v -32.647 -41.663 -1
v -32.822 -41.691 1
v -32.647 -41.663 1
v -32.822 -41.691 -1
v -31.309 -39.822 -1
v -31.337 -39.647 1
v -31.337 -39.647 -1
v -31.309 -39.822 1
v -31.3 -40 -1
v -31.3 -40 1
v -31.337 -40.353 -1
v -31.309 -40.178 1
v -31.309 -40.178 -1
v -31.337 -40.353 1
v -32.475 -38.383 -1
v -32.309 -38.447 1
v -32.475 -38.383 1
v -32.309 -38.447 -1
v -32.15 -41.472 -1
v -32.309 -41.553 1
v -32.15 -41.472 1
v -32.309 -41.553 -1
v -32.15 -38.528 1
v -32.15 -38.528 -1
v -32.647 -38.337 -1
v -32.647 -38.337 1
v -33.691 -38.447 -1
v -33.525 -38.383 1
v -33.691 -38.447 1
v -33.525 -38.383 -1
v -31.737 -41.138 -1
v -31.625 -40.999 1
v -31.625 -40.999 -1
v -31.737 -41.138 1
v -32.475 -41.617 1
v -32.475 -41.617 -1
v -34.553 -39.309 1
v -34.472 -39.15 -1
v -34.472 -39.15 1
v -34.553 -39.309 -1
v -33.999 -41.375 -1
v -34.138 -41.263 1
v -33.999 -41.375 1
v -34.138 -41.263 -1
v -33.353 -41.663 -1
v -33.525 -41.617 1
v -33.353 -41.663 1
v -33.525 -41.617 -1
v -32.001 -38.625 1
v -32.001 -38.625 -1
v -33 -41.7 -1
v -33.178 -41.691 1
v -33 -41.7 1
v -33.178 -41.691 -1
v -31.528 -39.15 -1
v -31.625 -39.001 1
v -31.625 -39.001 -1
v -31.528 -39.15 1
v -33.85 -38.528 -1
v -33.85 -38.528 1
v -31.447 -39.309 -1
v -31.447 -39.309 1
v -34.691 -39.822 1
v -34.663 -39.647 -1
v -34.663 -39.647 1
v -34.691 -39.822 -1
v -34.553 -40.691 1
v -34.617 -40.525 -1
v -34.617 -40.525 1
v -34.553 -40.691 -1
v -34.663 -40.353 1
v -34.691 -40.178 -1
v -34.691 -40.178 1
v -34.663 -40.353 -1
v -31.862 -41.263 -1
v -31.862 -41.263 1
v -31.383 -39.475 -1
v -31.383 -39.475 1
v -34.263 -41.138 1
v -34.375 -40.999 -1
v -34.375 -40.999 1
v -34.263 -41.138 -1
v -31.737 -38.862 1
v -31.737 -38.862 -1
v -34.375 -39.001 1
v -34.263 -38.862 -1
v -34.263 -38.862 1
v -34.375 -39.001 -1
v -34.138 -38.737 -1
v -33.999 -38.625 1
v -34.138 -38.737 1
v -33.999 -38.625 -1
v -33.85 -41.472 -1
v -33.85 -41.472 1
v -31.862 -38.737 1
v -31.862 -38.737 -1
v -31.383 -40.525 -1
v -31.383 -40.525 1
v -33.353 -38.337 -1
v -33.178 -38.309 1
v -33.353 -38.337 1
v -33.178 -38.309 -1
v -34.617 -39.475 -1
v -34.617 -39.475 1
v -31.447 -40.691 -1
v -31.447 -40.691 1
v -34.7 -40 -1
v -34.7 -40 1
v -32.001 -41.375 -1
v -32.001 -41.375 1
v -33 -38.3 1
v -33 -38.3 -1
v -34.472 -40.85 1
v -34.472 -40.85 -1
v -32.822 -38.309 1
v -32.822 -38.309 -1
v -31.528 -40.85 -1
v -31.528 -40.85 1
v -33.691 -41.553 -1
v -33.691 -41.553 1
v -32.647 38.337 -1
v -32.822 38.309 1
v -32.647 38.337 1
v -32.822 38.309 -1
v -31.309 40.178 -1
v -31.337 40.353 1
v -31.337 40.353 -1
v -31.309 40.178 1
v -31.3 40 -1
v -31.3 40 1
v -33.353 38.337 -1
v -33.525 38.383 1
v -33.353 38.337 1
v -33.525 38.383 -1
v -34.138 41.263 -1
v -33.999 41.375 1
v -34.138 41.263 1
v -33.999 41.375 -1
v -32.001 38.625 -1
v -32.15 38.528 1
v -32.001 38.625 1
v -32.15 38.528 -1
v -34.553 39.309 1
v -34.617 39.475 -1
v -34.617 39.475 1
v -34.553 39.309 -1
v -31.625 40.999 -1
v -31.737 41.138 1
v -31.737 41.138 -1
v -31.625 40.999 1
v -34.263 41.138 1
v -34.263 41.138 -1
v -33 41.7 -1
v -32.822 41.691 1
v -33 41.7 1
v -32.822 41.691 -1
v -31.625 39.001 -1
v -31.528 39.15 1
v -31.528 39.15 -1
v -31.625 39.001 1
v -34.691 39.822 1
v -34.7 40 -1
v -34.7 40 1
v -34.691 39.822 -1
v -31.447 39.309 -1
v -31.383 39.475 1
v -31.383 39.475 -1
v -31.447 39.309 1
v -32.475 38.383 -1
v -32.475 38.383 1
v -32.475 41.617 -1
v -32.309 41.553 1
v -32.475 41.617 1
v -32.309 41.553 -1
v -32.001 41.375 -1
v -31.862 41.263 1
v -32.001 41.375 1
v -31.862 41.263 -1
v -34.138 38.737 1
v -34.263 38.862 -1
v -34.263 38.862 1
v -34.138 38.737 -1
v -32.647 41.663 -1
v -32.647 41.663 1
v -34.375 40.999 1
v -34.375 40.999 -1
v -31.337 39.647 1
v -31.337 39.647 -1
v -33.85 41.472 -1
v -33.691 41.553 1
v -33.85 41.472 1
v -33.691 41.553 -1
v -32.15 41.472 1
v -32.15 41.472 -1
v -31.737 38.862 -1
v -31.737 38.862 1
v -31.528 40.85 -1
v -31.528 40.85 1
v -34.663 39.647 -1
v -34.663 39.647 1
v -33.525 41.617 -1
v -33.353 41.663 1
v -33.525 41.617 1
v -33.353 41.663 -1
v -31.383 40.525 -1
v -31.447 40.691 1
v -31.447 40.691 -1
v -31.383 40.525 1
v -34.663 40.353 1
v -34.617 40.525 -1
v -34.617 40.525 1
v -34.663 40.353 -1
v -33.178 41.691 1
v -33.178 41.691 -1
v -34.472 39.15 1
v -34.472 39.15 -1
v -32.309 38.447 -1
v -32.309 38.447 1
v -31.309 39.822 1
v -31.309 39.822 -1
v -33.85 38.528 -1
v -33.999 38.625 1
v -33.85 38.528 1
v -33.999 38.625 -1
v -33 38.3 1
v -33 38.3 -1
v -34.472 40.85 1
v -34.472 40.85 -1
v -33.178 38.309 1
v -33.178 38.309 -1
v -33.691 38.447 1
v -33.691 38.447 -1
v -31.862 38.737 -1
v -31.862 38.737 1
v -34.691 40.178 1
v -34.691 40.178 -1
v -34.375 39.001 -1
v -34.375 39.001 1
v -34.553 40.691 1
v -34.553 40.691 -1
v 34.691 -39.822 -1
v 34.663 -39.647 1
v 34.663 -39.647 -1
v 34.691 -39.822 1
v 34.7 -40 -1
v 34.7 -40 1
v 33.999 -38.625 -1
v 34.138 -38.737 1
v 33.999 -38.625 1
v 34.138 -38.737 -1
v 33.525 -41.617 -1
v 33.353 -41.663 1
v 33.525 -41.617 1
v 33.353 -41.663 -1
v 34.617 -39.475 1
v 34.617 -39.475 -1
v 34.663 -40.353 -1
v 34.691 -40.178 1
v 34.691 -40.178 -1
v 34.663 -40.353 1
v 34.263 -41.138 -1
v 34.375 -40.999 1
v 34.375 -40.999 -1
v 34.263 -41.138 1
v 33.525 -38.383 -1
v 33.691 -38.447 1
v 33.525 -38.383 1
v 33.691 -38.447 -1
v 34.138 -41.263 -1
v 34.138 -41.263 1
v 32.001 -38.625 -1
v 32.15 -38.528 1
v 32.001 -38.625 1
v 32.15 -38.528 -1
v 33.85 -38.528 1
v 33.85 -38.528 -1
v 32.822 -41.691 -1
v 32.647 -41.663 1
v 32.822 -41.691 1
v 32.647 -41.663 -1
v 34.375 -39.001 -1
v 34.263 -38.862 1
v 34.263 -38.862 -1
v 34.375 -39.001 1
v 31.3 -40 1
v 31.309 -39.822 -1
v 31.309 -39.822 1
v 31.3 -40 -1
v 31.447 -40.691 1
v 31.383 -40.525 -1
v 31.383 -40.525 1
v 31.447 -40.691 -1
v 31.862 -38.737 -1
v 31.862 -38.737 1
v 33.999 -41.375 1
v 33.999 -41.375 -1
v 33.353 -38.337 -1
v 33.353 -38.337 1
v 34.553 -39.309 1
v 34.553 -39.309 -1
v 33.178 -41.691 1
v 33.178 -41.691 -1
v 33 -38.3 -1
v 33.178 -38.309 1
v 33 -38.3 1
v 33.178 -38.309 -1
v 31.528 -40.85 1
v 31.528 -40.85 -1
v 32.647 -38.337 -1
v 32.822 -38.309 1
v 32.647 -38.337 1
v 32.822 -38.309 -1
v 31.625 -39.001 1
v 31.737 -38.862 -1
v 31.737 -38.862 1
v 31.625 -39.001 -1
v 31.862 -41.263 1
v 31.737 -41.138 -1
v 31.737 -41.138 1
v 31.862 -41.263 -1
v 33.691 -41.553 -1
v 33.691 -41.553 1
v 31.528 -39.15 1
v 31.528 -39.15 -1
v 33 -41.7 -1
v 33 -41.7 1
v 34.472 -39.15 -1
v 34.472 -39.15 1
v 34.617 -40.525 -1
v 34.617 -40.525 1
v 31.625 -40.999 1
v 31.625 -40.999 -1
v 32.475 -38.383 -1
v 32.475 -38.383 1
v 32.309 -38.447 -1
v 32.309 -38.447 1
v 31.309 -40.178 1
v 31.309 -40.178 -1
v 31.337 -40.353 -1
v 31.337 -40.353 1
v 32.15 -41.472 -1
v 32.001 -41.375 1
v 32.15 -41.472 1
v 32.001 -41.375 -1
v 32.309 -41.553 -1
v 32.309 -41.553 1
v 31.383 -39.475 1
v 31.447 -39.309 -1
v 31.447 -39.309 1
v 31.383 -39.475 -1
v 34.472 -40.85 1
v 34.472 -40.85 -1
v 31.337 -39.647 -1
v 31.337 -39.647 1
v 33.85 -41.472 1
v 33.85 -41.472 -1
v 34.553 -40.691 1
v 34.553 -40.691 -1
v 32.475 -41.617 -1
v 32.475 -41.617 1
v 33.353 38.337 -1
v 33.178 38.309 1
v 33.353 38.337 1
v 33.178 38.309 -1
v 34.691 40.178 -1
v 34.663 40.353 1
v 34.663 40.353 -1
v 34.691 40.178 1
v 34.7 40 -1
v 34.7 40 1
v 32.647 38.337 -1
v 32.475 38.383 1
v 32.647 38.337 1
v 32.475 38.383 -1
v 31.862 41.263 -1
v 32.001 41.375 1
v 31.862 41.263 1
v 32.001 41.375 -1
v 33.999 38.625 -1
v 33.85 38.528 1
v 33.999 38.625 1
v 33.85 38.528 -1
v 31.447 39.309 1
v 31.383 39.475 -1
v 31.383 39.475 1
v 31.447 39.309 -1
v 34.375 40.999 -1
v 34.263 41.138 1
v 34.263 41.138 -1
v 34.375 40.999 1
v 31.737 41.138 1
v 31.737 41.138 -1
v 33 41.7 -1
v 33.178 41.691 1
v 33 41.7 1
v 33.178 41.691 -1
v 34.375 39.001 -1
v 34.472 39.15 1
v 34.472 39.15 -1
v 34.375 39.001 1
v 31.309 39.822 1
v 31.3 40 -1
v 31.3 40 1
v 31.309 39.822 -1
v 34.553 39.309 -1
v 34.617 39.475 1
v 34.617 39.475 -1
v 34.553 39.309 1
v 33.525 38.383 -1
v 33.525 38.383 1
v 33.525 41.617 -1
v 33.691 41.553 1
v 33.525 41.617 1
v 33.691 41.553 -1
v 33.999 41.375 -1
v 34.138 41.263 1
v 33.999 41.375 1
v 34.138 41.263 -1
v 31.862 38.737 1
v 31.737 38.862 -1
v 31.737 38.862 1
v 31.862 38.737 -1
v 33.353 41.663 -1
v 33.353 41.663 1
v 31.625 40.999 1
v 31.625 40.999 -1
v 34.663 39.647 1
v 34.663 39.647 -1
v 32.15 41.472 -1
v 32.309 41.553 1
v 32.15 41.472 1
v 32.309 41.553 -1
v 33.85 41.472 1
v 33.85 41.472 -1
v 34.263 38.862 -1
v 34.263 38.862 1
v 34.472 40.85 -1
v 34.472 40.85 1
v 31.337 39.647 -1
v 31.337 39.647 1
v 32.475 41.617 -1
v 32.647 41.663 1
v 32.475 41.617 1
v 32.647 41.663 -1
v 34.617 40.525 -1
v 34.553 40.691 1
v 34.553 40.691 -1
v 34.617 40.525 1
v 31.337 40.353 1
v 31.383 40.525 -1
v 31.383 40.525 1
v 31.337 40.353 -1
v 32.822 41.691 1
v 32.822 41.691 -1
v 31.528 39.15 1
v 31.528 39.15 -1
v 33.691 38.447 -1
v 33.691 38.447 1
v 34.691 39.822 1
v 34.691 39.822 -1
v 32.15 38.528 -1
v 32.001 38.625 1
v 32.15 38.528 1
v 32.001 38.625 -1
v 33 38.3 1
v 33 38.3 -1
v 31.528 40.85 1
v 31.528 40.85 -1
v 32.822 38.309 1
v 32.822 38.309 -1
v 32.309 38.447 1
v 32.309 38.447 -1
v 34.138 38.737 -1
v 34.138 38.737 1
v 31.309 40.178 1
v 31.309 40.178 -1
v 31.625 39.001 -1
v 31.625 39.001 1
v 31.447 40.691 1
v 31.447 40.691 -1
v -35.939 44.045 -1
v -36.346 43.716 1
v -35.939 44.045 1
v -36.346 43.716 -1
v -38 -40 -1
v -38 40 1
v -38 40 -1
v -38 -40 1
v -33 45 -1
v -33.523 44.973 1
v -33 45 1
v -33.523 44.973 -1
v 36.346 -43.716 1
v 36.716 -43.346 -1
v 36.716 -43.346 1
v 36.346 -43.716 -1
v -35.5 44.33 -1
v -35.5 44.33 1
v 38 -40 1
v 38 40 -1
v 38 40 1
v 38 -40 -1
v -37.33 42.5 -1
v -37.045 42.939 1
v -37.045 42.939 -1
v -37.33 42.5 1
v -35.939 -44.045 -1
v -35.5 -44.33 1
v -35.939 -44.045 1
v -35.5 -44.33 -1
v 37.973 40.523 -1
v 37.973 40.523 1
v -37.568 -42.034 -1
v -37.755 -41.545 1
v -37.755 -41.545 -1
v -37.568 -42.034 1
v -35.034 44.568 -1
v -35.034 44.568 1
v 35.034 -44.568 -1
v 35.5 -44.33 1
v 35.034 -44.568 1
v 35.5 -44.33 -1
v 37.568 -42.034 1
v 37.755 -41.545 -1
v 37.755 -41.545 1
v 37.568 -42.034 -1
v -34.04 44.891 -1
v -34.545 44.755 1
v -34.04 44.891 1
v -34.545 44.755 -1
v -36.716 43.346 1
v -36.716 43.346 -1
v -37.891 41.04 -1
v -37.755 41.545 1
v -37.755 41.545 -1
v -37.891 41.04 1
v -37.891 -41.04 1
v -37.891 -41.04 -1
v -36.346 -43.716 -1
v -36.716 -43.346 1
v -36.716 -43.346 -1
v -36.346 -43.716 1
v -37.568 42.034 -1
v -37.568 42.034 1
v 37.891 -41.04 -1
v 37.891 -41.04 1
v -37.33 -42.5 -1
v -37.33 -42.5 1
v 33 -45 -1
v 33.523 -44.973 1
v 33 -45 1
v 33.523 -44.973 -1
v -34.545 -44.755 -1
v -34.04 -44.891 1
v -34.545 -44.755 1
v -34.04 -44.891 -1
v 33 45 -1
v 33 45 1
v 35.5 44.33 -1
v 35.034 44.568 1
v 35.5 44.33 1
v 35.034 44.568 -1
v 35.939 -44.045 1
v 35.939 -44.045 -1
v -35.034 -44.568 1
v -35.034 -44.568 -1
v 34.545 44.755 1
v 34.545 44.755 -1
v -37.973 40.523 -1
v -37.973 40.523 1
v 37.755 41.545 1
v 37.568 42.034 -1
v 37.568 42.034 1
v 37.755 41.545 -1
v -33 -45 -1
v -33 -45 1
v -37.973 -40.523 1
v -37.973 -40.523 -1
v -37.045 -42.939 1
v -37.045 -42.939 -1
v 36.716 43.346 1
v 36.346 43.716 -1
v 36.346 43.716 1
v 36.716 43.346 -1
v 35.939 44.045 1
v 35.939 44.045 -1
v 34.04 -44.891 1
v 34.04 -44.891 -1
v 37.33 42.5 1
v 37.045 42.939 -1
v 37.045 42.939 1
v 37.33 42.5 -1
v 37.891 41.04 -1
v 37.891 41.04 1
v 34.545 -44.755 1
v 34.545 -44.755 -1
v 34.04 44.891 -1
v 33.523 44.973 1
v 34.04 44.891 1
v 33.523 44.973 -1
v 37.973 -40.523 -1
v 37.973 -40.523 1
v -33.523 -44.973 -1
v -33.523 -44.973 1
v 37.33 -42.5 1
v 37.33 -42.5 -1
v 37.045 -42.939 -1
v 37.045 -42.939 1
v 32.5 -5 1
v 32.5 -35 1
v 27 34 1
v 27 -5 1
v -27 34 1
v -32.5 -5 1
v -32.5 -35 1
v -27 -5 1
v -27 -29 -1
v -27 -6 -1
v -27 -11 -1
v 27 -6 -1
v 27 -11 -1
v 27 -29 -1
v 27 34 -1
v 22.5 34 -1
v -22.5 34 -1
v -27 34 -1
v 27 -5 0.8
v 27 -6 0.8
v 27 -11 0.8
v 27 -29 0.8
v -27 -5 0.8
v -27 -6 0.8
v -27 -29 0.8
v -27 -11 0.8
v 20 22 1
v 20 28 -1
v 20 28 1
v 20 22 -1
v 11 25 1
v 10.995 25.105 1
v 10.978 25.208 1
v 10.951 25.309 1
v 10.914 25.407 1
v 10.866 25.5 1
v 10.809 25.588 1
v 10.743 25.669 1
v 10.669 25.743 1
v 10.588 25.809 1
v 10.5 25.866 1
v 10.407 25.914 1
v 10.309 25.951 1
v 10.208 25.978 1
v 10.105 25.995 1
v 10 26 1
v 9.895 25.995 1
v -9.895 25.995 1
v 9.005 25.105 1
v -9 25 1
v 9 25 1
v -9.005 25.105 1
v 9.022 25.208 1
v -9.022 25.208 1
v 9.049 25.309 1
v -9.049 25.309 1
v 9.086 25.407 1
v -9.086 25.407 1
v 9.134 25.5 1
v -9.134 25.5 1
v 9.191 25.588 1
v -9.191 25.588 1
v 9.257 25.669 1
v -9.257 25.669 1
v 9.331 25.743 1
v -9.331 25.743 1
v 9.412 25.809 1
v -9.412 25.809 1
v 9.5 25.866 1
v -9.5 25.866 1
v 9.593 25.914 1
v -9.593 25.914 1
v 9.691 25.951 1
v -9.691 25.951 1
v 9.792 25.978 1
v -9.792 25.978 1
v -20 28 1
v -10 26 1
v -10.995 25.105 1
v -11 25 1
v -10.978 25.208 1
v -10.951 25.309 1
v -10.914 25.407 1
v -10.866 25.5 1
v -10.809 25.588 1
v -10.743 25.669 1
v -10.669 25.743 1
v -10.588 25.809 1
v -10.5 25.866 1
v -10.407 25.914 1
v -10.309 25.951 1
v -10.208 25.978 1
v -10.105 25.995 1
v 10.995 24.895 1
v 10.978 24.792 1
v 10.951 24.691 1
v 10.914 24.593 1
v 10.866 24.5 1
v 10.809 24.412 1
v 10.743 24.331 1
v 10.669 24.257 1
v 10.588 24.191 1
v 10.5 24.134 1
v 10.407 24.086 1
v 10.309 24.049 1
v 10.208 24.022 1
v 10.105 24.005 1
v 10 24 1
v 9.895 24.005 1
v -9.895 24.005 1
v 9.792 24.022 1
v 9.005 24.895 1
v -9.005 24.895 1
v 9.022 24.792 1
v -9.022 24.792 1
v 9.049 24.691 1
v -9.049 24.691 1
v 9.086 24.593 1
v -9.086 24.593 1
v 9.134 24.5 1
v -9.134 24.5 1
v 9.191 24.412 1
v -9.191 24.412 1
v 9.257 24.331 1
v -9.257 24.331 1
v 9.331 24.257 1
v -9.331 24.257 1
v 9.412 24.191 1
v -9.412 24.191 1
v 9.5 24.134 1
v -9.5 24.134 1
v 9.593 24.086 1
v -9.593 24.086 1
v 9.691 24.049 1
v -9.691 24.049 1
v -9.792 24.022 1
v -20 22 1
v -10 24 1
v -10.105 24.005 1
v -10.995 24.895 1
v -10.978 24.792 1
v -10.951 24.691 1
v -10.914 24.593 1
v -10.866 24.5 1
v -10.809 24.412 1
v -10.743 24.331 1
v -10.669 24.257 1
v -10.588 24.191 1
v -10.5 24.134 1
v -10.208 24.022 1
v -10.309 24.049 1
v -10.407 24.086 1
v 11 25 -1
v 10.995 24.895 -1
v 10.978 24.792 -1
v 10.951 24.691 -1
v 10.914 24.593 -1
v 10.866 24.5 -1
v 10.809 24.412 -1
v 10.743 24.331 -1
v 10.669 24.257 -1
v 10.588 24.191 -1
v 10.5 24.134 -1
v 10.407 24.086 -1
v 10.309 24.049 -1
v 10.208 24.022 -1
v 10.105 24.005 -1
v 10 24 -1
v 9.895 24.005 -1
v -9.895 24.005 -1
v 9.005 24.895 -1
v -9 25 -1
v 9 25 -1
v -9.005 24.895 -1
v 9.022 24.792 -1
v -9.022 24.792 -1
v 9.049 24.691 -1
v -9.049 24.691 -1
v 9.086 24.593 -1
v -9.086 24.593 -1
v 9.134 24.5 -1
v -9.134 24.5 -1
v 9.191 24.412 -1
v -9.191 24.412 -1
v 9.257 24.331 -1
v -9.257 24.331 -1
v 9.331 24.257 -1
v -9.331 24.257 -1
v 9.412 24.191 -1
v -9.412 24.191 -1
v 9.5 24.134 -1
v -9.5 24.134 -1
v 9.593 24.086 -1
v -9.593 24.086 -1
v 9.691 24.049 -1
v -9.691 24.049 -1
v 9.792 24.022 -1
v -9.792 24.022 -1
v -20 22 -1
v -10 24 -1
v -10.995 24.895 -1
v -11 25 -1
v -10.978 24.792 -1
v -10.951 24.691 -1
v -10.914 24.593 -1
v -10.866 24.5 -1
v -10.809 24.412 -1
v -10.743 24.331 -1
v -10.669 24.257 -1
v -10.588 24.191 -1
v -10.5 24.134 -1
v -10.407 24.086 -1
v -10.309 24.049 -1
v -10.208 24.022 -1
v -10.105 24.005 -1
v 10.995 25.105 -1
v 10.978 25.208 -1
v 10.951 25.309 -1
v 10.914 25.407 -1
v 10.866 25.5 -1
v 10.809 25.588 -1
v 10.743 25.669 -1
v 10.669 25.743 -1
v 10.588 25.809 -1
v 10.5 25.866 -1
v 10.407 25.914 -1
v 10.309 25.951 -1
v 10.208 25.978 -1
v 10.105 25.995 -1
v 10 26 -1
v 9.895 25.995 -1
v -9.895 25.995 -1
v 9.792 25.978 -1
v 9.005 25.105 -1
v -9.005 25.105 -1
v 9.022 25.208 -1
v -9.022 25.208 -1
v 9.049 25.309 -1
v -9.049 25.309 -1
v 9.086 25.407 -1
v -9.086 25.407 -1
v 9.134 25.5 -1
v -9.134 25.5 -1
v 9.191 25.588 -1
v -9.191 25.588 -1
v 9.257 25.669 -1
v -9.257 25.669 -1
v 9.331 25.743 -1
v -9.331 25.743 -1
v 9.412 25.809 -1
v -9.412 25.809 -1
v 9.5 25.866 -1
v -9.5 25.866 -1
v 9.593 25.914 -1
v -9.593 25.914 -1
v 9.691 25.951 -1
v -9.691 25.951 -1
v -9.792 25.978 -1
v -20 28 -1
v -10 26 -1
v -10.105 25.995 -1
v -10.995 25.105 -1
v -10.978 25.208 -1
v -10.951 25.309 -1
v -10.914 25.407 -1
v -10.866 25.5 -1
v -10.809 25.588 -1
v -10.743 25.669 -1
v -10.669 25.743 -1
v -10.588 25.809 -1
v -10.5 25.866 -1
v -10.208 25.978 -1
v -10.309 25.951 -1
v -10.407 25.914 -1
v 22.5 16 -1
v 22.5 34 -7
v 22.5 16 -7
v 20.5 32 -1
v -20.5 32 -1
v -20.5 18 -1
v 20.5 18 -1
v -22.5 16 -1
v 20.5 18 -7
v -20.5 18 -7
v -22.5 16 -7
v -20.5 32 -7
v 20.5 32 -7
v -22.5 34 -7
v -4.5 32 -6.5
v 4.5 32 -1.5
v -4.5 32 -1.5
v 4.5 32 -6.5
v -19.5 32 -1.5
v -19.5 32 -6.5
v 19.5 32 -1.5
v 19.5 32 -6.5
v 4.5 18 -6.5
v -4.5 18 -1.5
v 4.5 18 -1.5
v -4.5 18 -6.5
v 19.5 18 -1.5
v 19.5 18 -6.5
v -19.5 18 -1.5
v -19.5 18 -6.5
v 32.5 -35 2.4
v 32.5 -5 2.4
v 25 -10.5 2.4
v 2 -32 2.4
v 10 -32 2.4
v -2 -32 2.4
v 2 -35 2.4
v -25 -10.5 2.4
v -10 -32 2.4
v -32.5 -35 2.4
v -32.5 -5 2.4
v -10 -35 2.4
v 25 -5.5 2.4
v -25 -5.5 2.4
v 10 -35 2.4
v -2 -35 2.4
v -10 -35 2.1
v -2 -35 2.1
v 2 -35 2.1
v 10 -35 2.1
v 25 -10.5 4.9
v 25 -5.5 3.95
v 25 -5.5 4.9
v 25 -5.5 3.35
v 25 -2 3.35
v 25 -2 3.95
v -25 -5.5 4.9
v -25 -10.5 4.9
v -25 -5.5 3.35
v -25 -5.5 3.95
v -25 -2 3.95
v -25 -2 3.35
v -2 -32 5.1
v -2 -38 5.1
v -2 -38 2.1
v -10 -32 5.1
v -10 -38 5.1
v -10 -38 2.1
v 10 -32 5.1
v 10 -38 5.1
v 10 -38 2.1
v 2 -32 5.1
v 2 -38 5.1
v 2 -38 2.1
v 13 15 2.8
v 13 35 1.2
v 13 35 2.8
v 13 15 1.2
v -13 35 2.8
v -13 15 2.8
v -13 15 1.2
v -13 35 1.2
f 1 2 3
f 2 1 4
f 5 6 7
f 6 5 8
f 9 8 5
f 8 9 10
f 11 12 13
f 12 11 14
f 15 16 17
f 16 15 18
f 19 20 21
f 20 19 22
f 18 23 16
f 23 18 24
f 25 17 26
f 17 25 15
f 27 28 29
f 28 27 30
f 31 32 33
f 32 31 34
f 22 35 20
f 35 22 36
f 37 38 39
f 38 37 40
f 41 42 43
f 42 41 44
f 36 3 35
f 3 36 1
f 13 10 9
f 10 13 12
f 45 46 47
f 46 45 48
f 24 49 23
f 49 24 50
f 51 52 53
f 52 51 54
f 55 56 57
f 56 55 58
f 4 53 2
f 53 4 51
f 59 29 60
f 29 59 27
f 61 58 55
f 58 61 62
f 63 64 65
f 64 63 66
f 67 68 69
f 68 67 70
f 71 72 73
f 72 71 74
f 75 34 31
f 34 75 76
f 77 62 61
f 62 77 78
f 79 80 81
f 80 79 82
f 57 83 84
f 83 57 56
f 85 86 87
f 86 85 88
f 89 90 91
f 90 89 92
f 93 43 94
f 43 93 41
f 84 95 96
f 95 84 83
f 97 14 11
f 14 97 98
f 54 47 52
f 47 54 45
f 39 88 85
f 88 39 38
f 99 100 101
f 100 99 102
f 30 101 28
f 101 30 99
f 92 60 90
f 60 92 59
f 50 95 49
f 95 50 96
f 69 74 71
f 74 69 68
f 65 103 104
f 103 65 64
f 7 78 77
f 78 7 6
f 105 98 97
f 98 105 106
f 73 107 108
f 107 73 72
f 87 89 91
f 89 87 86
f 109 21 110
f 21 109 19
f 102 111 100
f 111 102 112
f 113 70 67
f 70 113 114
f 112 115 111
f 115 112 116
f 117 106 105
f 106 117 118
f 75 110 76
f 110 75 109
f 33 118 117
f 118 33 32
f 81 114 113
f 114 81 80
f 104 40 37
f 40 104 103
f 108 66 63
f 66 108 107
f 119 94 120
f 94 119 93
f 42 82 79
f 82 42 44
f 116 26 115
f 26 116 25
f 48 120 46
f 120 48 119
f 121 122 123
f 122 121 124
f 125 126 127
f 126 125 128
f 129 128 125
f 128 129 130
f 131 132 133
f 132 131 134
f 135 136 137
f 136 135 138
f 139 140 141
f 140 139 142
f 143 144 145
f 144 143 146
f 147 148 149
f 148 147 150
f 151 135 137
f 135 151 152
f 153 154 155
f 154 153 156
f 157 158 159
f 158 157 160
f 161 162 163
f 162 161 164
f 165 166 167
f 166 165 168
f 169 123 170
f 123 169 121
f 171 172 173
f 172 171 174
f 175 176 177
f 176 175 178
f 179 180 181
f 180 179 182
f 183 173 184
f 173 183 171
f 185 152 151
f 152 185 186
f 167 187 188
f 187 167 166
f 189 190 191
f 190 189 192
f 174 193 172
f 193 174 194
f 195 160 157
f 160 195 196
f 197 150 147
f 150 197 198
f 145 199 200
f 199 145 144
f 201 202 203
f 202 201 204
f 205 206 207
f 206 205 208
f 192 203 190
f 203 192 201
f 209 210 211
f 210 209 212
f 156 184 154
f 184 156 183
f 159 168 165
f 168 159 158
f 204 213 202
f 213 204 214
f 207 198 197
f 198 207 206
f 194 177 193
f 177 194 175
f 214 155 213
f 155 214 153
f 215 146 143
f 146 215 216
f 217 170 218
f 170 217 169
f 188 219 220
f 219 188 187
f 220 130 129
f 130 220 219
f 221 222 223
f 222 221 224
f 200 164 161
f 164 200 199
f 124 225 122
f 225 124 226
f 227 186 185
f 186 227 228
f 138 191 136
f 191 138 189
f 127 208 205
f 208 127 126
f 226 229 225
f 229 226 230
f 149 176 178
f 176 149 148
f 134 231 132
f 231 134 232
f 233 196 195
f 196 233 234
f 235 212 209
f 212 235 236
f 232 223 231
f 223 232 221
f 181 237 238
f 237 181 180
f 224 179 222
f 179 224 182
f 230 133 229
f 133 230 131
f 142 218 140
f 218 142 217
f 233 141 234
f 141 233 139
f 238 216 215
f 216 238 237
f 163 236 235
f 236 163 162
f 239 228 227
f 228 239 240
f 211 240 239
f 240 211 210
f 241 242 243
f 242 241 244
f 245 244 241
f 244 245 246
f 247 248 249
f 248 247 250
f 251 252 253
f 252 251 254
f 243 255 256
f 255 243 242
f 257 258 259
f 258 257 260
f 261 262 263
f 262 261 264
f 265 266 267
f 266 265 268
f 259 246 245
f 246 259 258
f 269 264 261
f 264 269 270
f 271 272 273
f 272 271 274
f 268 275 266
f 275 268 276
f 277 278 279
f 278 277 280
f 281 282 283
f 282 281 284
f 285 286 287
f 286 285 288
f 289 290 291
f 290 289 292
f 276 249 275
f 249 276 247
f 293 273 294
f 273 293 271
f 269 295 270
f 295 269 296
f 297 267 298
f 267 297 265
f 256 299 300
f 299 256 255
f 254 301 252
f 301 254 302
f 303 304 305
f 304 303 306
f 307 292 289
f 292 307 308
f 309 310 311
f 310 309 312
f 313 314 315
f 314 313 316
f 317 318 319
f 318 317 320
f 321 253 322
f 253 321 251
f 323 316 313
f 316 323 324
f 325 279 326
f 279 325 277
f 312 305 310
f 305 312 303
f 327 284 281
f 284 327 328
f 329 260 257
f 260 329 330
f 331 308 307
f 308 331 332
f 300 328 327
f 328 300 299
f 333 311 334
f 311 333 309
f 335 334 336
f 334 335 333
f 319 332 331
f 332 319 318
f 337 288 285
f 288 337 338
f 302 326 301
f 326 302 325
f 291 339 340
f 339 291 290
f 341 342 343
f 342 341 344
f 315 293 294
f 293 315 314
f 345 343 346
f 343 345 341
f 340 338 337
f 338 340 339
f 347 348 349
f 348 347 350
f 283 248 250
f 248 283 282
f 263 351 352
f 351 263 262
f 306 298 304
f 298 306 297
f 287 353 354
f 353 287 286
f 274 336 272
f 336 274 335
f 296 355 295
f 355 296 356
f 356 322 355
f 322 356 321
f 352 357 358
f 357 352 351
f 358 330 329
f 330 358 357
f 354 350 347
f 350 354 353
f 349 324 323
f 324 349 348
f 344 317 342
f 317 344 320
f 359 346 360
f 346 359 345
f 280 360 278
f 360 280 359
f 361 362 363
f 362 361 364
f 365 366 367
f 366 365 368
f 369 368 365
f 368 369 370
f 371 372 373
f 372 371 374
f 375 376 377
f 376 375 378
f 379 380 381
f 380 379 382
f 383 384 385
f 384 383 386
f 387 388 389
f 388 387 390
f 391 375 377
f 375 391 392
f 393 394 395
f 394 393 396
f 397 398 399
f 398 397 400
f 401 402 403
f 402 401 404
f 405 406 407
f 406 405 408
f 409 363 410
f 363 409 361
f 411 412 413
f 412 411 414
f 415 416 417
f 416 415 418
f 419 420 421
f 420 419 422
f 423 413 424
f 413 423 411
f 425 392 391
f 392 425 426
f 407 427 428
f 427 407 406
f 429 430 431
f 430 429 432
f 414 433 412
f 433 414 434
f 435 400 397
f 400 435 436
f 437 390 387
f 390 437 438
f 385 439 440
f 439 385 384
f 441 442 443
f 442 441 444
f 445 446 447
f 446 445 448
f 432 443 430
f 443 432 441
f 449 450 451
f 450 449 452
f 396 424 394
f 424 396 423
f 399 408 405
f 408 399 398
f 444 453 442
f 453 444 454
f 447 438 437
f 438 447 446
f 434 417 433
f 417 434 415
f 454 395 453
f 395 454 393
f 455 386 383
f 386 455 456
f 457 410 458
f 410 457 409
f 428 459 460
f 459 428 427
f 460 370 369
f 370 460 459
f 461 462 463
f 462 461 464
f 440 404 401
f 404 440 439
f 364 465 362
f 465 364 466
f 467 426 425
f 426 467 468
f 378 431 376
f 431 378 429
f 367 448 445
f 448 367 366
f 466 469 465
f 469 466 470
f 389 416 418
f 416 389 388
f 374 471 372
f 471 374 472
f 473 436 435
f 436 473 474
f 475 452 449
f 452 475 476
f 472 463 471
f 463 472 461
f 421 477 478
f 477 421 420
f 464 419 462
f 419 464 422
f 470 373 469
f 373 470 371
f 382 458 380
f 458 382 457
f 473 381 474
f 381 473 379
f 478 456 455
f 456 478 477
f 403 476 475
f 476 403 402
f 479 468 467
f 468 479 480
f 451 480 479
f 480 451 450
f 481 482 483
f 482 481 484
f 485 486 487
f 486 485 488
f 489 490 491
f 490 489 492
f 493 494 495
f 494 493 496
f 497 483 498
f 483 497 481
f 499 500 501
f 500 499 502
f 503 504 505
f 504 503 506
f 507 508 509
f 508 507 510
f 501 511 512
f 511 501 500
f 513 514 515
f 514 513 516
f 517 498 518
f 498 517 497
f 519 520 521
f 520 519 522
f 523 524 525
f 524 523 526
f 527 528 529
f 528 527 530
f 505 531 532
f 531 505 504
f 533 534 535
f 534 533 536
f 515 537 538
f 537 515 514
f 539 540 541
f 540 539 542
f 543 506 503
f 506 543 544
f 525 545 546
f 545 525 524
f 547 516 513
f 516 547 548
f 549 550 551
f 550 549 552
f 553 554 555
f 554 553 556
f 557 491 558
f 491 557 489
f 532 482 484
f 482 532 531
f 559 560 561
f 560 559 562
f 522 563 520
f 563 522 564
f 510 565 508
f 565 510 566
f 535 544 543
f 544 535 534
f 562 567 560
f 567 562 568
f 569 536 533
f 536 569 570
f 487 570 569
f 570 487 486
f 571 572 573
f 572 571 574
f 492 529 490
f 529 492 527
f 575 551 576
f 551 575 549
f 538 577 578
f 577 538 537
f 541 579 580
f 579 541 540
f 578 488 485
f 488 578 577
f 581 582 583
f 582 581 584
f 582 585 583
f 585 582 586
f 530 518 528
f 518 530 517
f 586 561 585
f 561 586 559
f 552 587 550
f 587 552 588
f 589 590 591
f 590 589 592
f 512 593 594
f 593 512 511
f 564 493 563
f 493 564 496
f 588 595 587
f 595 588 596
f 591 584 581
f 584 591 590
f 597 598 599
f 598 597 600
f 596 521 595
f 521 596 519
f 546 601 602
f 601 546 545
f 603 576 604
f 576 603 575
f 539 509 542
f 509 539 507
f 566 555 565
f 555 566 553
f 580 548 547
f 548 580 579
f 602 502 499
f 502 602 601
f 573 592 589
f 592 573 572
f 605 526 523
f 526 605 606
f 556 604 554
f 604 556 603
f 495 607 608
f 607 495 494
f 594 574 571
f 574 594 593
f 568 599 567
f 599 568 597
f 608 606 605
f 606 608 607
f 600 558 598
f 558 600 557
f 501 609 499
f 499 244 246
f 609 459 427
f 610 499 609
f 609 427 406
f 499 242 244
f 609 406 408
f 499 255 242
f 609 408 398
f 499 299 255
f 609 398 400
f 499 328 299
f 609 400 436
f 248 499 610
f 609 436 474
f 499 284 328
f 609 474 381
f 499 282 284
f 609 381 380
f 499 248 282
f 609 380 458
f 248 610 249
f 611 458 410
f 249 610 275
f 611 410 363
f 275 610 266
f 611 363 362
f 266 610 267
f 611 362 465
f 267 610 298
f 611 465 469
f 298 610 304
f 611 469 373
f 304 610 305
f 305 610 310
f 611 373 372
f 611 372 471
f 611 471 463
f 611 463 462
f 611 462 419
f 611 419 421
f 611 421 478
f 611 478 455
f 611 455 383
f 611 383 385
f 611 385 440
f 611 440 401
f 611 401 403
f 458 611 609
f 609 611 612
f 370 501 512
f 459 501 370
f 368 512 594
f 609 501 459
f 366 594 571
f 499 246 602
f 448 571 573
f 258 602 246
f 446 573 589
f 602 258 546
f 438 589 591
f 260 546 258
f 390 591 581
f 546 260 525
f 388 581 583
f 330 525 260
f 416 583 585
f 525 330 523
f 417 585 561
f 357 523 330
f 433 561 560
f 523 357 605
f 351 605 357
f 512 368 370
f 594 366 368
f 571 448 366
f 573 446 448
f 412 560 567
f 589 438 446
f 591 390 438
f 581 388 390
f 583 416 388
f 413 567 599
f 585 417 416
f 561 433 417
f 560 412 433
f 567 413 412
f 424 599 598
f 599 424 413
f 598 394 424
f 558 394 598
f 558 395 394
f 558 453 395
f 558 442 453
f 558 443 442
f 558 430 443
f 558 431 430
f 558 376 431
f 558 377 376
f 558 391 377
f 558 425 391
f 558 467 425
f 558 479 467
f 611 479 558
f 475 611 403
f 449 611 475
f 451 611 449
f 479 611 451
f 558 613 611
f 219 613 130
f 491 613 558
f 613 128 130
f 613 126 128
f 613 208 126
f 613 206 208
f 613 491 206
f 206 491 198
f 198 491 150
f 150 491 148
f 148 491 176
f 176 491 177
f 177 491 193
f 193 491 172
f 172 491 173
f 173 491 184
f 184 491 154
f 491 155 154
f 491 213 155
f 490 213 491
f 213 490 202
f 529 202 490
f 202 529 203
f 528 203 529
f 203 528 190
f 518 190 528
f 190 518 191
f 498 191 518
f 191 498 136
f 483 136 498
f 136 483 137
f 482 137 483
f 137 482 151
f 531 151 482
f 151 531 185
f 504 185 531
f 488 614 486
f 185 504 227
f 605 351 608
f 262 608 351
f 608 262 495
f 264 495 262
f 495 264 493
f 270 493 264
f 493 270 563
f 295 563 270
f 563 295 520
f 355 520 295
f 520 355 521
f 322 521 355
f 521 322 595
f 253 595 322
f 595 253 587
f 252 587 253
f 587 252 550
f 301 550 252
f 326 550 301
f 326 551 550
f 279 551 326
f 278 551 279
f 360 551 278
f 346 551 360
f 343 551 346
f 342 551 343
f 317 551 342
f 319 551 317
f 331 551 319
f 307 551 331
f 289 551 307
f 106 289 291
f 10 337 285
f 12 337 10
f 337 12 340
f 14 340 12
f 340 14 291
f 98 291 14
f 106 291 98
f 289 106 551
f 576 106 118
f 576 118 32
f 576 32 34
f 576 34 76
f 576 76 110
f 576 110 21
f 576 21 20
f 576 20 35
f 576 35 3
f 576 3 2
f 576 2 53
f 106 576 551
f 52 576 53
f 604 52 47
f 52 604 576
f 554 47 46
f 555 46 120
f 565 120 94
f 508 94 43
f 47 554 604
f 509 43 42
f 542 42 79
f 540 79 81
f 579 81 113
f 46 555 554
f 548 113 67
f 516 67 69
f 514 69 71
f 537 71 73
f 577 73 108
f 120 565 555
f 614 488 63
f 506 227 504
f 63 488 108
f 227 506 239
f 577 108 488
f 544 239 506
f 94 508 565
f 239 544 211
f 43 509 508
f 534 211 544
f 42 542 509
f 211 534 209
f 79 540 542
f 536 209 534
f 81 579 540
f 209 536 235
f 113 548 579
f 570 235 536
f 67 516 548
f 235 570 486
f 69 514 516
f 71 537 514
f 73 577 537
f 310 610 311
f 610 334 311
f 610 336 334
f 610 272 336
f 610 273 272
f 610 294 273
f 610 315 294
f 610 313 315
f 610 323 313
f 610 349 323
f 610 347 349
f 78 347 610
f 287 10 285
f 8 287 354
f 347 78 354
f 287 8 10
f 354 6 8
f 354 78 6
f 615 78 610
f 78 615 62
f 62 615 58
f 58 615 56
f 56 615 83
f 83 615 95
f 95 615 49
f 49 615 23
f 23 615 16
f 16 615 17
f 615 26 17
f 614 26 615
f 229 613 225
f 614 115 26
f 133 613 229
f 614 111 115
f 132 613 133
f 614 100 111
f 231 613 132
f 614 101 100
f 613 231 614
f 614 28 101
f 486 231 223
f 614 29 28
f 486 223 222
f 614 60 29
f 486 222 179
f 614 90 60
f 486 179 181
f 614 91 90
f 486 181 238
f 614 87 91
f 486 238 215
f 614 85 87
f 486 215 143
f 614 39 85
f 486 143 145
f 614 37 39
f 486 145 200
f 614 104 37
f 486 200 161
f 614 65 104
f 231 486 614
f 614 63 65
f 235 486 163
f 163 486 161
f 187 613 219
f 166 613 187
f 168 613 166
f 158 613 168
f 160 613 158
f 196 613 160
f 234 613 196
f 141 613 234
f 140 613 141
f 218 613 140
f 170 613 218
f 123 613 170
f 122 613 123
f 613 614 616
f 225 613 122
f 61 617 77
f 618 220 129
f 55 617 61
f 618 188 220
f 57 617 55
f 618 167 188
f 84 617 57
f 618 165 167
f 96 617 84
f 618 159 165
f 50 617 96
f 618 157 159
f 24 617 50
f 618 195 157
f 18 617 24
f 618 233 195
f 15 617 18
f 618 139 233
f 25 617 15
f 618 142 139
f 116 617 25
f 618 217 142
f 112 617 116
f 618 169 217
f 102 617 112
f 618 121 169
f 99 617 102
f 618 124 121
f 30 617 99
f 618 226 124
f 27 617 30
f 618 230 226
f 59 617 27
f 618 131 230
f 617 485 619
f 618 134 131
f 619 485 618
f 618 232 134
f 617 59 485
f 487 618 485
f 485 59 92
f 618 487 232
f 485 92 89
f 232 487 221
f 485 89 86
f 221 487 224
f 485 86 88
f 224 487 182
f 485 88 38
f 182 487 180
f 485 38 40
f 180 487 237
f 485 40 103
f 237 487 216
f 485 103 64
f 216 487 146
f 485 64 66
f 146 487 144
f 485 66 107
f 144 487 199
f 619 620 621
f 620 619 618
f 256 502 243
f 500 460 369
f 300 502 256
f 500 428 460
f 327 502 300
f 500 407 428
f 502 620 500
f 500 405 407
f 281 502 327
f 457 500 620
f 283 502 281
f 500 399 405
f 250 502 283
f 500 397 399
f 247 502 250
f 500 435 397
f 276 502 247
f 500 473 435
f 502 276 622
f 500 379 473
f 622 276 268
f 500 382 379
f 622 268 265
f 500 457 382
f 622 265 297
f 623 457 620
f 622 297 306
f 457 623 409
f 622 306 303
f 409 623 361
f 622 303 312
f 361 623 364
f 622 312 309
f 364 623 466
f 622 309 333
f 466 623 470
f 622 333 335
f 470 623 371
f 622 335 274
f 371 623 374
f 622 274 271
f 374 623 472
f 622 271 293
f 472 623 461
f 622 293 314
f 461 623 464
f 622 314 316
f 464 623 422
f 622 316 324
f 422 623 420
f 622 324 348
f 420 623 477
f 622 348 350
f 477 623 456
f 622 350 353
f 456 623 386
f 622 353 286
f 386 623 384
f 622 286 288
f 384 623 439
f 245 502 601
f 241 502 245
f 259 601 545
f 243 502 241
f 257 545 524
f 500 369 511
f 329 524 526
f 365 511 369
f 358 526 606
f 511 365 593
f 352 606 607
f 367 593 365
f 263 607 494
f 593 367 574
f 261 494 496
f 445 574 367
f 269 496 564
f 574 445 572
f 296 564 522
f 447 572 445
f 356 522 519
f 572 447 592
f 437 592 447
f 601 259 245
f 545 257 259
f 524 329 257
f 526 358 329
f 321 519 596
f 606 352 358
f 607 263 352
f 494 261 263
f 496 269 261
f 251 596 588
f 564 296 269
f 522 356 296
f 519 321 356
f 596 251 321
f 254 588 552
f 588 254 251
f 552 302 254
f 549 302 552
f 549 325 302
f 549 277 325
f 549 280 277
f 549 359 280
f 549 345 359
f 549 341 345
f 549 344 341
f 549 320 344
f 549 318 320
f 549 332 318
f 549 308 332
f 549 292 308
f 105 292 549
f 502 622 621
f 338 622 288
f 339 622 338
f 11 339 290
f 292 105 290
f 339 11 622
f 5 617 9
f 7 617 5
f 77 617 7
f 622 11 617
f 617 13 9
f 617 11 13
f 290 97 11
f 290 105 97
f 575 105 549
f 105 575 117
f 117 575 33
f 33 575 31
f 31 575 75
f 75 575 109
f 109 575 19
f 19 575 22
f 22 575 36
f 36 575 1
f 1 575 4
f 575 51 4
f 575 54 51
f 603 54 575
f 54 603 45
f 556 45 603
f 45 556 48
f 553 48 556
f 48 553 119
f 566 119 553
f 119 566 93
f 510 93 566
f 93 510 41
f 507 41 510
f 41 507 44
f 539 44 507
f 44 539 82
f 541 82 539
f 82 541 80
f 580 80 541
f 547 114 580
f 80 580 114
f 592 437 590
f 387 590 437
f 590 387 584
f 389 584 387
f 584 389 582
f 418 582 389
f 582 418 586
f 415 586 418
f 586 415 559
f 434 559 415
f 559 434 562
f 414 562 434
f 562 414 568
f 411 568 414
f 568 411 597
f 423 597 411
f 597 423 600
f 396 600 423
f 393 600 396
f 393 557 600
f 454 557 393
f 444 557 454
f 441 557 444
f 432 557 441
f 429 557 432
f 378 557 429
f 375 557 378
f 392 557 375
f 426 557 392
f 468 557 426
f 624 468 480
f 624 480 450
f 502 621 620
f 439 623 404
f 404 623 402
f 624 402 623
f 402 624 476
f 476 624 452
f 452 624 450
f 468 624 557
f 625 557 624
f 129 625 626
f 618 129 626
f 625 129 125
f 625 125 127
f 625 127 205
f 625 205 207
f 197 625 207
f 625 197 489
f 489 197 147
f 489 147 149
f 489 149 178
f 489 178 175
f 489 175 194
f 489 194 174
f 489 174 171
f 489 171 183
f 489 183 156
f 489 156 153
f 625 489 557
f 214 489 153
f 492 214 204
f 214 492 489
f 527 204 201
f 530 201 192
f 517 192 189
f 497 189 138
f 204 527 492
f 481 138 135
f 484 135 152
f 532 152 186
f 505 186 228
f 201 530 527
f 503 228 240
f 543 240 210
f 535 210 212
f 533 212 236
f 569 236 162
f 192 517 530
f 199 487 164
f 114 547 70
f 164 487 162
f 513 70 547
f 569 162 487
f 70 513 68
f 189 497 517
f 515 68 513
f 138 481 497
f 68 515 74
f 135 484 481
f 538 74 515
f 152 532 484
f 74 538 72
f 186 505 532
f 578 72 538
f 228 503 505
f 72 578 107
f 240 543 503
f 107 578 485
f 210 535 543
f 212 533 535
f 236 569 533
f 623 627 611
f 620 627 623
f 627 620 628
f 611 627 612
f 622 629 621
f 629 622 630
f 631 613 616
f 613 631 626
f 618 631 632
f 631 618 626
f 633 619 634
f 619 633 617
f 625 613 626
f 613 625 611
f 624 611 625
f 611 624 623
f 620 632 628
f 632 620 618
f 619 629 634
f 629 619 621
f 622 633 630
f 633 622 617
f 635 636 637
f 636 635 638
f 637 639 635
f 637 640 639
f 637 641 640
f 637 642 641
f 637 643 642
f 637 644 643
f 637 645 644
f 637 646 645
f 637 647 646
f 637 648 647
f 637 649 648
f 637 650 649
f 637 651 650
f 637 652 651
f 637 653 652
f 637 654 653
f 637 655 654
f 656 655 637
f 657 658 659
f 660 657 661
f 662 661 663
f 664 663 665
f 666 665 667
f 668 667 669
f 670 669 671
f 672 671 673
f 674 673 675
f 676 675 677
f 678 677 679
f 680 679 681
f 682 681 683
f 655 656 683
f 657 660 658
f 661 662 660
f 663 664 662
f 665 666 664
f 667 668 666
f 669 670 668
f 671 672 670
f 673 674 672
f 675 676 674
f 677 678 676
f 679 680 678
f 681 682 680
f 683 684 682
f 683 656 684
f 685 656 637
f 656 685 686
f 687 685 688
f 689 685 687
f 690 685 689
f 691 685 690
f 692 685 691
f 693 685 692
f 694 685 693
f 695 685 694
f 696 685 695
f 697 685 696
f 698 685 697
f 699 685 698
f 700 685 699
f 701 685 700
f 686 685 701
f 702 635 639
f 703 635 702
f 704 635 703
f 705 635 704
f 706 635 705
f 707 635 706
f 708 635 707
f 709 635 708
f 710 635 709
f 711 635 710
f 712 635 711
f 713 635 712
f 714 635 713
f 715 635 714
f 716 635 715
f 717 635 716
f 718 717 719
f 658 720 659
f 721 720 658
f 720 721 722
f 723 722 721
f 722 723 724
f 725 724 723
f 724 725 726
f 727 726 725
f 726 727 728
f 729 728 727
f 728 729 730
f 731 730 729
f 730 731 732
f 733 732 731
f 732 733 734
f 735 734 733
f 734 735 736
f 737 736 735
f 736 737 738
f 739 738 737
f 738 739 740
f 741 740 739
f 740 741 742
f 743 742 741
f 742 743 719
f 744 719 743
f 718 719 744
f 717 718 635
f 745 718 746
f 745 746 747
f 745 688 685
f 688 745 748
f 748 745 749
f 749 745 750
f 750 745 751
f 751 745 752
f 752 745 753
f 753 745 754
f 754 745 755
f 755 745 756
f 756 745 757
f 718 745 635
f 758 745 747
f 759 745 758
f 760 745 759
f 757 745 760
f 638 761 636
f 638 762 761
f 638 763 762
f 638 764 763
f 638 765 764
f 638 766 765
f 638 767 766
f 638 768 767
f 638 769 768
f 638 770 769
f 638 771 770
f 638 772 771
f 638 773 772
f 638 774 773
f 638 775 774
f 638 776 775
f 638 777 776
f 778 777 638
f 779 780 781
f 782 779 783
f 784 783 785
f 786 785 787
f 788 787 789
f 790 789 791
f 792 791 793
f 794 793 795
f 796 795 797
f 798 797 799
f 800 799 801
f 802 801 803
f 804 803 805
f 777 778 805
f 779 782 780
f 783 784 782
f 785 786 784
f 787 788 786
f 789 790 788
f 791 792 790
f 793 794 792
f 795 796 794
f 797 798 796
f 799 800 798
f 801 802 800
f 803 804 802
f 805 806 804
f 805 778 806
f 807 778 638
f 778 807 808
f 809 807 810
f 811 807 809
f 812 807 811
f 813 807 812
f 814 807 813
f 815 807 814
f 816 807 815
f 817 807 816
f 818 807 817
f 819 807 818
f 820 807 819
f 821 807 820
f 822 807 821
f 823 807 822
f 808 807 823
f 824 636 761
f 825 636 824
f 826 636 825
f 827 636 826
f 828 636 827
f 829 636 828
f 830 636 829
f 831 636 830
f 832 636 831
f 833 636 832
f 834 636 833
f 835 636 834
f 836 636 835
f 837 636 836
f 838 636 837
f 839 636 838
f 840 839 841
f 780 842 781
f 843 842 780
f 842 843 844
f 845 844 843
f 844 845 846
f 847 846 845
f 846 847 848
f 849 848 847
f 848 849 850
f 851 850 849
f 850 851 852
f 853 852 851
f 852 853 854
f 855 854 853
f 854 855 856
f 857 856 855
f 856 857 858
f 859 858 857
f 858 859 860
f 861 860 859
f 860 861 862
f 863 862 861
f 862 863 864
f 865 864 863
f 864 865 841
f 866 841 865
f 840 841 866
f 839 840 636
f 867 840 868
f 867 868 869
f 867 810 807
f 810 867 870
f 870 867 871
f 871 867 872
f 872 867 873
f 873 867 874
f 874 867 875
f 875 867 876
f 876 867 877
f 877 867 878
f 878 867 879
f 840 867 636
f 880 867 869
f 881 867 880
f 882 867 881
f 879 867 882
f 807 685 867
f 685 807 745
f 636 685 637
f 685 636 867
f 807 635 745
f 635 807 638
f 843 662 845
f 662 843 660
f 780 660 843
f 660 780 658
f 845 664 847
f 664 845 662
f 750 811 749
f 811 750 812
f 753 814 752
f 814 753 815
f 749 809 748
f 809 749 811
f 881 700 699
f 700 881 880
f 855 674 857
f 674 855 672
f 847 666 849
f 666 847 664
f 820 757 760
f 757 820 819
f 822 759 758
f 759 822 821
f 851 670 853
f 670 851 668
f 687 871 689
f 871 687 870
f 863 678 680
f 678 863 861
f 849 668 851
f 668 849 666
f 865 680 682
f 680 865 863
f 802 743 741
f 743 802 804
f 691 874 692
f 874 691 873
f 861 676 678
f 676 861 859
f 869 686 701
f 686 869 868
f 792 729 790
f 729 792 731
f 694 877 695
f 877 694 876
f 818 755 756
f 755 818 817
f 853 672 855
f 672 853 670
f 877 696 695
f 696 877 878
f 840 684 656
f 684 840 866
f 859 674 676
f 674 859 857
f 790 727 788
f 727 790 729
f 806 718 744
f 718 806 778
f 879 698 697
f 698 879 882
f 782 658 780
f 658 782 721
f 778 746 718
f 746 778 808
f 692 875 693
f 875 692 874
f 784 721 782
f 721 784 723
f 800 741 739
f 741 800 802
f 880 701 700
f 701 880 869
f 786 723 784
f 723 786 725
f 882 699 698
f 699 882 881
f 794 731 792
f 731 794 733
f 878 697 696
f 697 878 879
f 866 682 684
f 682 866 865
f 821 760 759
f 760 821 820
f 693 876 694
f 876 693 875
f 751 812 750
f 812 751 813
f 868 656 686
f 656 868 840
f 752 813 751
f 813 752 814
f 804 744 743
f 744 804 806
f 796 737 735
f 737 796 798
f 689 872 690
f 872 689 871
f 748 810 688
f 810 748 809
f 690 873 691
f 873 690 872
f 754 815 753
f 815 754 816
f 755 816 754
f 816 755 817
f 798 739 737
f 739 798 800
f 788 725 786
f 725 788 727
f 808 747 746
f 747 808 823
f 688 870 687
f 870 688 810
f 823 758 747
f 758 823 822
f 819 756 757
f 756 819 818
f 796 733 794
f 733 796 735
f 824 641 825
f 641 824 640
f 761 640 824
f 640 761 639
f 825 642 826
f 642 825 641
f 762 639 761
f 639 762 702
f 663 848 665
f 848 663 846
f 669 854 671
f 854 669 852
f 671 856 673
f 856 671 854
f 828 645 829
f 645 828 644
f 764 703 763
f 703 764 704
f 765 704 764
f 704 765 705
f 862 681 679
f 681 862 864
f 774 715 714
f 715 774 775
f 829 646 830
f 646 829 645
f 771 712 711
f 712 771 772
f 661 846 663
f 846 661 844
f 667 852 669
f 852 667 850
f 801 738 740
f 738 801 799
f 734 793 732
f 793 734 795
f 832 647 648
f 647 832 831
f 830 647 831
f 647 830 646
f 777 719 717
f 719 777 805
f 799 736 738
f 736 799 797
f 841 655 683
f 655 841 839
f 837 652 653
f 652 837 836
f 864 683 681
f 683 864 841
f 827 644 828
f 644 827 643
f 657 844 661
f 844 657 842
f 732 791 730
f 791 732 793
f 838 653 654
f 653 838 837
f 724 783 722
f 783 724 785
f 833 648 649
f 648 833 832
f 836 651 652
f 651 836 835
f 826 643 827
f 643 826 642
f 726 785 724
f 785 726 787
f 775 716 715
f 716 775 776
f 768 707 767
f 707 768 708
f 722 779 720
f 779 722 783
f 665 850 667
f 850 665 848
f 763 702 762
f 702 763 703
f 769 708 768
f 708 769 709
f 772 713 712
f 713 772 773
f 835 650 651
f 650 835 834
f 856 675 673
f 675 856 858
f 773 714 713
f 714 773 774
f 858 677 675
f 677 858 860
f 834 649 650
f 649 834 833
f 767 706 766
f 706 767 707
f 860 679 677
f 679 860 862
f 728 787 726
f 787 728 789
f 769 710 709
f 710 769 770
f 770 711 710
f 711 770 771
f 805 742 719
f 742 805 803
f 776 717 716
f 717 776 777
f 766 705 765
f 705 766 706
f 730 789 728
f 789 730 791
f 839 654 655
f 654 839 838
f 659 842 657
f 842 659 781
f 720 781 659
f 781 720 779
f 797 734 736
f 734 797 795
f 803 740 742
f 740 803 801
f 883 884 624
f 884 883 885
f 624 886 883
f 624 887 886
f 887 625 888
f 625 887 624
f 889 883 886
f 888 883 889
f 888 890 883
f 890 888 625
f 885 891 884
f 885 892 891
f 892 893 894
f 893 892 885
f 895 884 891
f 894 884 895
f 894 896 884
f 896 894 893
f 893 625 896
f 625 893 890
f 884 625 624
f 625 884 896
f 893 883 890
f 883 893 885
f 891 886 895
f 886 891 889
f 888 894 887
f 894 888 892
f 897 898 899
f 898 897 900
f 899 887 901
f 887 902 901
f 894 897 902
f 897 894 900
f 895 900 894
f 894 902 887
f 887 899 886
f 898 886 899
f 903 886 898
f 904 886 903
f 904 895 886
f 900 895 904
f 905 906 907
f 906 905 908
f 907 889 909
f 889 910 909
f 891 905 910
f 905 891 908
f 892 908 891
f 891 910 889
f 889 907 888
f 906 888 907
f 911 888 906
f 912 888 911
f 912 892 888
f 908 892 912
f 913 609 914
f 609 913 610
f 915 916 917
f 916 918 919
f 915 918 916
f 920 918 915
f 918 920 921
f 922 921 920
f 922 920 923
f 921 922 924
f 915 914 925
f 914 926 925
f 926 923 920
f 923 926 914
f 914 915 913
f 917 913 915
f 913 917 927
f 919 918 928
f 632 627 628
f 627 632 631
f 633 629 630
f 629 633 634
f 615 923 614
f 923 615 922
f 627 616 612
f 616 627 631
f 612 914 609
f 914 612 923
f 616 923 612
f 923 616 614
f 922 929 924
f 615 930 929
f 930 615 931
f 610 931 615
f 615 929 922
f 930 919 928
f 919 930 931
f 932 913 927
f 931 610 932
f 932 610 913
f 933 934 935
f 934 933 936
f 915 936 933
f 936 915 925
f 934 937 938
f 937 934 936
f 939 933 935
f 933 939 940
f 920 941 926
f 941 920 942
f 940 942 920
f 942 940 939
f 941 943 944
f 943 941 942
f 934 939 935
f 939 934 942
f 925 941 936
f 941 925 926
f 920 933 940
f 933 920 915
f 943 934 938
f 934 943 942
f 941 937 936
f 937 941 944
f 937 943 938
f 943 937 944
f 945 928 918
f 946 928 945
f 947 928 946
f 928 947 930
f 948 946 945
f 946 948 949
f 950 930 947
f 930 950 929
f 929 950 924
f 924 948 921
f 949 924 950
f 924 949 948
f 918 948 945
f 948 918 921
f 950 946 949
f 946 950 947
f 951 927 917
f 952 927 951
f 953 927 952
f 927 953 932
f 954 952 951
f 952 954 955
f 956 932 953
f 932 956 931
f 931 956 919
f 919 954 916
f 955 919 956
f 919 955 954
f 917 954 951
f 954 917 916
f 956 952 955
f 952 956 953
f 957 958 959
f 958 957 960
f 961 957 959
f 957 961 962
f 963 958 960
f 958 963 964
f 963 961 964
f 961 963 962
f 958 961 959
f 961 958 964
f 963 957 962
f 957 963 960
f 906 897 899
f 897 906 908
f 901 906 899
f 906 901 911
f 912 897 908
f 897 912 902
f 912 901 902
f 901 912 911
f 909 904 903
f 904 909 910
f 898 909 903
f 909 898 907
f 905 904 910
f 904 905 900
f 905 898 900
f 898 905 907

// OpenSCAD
// Insignia NS-CSPGASP "Landscape" Bracket
// CORRECTION: LANDSCAPE ORIENTATION (Horizontal).
// FIT: Pi (65mm) fits across Chassis (66mm).
// LAYOUT:
// - Bottom: Pi Zero 2 W (Horizontal). GPIO Header facing UP.
// - Top: HAT Breakout (Horizontal).
// - Top Rear: DAC Backpack.

$fn = 60;

// --- DIMS ---
chassis_w = 66; 
chassis_h = 80;
screw_dia = 3.4;

// Component Mounting Patterns
// PI ZERO (Landscape)
// Holes are 58mm apart horizontally, 23mm vertically.
pi_mount_w = 58; 
pi_mount_h = 23;

module suspension_frame() {
    union() {
        // 1. OUTER FRAME
        difference() {
            hull() {
                for(x=[-1,1]) for(y=[-1,1])
                    translate([x*chassis_w/2, y*chassis_h/2, 0]) cylinder(h=2, r=5, center=true);
            }
            // Cutout
            rounded_rect([chassis_w-12, chassis_h-12, 10], 2);
            // Chassis Holes
            for(x=[-1,1]) for(y=[-1,1])
                translate([x*chassis_w/2, y*chassis_h/2, 0]) cylinder(h=10, r=screw_dia/2, center=true);
        }
        
        // 2. PI MOUNTING BARS (Bottom Zone - Landscape)
        // Spans left-to-right to grab the wide mounting holes (58mm)
        translate([0, -20, 0]) { // Shifted Down
             difference() {
                 union() {
                     // Top Bar of Pi Mount
                     translate([0, pi_mount_h/2, 0]) cube([64, 5, 2], center=true);
                     // Bottom Bar of Pi Mount
                     translate([0, -pi_mount_h/2, 0]) cube([64, 5, 2], center=true);
                     // Vertical Links (Sides)
                     translate([-30, 0, 0]) cube([4, 25, 2], center=true);
                     translate([30, 0, 0]) cube([4, 25, 2], center=true);
                 }
                 // Mounting Holes
                 for(x=[-1,1]) for(y=[-1,1])
                    translate([x*pi_mount_w/2, y*pi_mount_h/2, 0]) cylinder(h=10, r=1.25, center=true);
             }
        }
        
        // 3. HAT MOUNTING (Top Zone)
        translate([0, 25, 0]) {
             difference() {
                 // Cross Bar
                 cube([40, 6, 2], center=true);
                 // Holes (20mm spacing)
                 translate([-10, 0, 0]) cylinder(h=10, r=1, center=true);
                 translate([10, 0, 0]) cylinder(h=10, r=1, center=true);
             }
        }
        
        // 4. DAC CAGE (Rear Top Zone)
        translate([0, 25, -4]) { 
             difference() {
                 cube([45, 18, 6], center=true);
                 cube([41, 14, 10], center=true);
             }
             // Studs
             translate([-12, 0, 0]) cylinder(h=4, r=2, center=true);
             translate([12, 0, 0]) cylinder(h=4, r=2, center=true);
        }
    }
}

module visualize_landscape() {
    // Pi Zero (Green) - Horizontal
    // GPIO Header should be at the TOP alignment.
    translate([0, -20, 1.6]) {
        color("green") cube([65, 30, 1.6], center=true); // PCB
        
        // GPIO Header (Black) - RIGHT ANGLE (Low Profile)
        // Sits flat against PCB. Height ~2.5mm. Pin direction: UP (Towards HAT).
        translate([0, 12, 1.6/2 + 1.25]) color("black") cube([50, 5, 2.5], center=true);
        // The Pins sticking OUT (Gold)
        translate([0, 15, 1.6/2 + 1.25]) color("gold") cube([50, 6, 0.6], center=true);
        // Wire Path Visualizer (Grey)
        %translate([0, 20, 2]) color("grey", 0.5) cube([40, 10, 2], center=true); 
        
        // USB Ports (Silver) - Bottom Edge
        translate([-6, -15, 2]) color("silver") cube([8, 6, 3], center=true);
        translate([6, -15, 2]) color("silver") cube([8, 6, 3], center=true);
    }
    
    // HAT (Purple)
    translate([0, 25, 2]) color("purple") cube([26, 20, 1.6], center=true); 
    
    // DACs (Blue)
    translate([-12, 25, -4]) color("blue") cube([15, 18, 5], center=true);
    translate([12, 25, -4]) color("blue") cube([15, 18, 5], center=true);
}

// Utility
module rounded_rect(size, radius) {
    x = size[0]; y = size[1]; z = size[2];
    cube(size, center=true); 
}

// RENDER
suspension_frame();
visualize_landscape();
